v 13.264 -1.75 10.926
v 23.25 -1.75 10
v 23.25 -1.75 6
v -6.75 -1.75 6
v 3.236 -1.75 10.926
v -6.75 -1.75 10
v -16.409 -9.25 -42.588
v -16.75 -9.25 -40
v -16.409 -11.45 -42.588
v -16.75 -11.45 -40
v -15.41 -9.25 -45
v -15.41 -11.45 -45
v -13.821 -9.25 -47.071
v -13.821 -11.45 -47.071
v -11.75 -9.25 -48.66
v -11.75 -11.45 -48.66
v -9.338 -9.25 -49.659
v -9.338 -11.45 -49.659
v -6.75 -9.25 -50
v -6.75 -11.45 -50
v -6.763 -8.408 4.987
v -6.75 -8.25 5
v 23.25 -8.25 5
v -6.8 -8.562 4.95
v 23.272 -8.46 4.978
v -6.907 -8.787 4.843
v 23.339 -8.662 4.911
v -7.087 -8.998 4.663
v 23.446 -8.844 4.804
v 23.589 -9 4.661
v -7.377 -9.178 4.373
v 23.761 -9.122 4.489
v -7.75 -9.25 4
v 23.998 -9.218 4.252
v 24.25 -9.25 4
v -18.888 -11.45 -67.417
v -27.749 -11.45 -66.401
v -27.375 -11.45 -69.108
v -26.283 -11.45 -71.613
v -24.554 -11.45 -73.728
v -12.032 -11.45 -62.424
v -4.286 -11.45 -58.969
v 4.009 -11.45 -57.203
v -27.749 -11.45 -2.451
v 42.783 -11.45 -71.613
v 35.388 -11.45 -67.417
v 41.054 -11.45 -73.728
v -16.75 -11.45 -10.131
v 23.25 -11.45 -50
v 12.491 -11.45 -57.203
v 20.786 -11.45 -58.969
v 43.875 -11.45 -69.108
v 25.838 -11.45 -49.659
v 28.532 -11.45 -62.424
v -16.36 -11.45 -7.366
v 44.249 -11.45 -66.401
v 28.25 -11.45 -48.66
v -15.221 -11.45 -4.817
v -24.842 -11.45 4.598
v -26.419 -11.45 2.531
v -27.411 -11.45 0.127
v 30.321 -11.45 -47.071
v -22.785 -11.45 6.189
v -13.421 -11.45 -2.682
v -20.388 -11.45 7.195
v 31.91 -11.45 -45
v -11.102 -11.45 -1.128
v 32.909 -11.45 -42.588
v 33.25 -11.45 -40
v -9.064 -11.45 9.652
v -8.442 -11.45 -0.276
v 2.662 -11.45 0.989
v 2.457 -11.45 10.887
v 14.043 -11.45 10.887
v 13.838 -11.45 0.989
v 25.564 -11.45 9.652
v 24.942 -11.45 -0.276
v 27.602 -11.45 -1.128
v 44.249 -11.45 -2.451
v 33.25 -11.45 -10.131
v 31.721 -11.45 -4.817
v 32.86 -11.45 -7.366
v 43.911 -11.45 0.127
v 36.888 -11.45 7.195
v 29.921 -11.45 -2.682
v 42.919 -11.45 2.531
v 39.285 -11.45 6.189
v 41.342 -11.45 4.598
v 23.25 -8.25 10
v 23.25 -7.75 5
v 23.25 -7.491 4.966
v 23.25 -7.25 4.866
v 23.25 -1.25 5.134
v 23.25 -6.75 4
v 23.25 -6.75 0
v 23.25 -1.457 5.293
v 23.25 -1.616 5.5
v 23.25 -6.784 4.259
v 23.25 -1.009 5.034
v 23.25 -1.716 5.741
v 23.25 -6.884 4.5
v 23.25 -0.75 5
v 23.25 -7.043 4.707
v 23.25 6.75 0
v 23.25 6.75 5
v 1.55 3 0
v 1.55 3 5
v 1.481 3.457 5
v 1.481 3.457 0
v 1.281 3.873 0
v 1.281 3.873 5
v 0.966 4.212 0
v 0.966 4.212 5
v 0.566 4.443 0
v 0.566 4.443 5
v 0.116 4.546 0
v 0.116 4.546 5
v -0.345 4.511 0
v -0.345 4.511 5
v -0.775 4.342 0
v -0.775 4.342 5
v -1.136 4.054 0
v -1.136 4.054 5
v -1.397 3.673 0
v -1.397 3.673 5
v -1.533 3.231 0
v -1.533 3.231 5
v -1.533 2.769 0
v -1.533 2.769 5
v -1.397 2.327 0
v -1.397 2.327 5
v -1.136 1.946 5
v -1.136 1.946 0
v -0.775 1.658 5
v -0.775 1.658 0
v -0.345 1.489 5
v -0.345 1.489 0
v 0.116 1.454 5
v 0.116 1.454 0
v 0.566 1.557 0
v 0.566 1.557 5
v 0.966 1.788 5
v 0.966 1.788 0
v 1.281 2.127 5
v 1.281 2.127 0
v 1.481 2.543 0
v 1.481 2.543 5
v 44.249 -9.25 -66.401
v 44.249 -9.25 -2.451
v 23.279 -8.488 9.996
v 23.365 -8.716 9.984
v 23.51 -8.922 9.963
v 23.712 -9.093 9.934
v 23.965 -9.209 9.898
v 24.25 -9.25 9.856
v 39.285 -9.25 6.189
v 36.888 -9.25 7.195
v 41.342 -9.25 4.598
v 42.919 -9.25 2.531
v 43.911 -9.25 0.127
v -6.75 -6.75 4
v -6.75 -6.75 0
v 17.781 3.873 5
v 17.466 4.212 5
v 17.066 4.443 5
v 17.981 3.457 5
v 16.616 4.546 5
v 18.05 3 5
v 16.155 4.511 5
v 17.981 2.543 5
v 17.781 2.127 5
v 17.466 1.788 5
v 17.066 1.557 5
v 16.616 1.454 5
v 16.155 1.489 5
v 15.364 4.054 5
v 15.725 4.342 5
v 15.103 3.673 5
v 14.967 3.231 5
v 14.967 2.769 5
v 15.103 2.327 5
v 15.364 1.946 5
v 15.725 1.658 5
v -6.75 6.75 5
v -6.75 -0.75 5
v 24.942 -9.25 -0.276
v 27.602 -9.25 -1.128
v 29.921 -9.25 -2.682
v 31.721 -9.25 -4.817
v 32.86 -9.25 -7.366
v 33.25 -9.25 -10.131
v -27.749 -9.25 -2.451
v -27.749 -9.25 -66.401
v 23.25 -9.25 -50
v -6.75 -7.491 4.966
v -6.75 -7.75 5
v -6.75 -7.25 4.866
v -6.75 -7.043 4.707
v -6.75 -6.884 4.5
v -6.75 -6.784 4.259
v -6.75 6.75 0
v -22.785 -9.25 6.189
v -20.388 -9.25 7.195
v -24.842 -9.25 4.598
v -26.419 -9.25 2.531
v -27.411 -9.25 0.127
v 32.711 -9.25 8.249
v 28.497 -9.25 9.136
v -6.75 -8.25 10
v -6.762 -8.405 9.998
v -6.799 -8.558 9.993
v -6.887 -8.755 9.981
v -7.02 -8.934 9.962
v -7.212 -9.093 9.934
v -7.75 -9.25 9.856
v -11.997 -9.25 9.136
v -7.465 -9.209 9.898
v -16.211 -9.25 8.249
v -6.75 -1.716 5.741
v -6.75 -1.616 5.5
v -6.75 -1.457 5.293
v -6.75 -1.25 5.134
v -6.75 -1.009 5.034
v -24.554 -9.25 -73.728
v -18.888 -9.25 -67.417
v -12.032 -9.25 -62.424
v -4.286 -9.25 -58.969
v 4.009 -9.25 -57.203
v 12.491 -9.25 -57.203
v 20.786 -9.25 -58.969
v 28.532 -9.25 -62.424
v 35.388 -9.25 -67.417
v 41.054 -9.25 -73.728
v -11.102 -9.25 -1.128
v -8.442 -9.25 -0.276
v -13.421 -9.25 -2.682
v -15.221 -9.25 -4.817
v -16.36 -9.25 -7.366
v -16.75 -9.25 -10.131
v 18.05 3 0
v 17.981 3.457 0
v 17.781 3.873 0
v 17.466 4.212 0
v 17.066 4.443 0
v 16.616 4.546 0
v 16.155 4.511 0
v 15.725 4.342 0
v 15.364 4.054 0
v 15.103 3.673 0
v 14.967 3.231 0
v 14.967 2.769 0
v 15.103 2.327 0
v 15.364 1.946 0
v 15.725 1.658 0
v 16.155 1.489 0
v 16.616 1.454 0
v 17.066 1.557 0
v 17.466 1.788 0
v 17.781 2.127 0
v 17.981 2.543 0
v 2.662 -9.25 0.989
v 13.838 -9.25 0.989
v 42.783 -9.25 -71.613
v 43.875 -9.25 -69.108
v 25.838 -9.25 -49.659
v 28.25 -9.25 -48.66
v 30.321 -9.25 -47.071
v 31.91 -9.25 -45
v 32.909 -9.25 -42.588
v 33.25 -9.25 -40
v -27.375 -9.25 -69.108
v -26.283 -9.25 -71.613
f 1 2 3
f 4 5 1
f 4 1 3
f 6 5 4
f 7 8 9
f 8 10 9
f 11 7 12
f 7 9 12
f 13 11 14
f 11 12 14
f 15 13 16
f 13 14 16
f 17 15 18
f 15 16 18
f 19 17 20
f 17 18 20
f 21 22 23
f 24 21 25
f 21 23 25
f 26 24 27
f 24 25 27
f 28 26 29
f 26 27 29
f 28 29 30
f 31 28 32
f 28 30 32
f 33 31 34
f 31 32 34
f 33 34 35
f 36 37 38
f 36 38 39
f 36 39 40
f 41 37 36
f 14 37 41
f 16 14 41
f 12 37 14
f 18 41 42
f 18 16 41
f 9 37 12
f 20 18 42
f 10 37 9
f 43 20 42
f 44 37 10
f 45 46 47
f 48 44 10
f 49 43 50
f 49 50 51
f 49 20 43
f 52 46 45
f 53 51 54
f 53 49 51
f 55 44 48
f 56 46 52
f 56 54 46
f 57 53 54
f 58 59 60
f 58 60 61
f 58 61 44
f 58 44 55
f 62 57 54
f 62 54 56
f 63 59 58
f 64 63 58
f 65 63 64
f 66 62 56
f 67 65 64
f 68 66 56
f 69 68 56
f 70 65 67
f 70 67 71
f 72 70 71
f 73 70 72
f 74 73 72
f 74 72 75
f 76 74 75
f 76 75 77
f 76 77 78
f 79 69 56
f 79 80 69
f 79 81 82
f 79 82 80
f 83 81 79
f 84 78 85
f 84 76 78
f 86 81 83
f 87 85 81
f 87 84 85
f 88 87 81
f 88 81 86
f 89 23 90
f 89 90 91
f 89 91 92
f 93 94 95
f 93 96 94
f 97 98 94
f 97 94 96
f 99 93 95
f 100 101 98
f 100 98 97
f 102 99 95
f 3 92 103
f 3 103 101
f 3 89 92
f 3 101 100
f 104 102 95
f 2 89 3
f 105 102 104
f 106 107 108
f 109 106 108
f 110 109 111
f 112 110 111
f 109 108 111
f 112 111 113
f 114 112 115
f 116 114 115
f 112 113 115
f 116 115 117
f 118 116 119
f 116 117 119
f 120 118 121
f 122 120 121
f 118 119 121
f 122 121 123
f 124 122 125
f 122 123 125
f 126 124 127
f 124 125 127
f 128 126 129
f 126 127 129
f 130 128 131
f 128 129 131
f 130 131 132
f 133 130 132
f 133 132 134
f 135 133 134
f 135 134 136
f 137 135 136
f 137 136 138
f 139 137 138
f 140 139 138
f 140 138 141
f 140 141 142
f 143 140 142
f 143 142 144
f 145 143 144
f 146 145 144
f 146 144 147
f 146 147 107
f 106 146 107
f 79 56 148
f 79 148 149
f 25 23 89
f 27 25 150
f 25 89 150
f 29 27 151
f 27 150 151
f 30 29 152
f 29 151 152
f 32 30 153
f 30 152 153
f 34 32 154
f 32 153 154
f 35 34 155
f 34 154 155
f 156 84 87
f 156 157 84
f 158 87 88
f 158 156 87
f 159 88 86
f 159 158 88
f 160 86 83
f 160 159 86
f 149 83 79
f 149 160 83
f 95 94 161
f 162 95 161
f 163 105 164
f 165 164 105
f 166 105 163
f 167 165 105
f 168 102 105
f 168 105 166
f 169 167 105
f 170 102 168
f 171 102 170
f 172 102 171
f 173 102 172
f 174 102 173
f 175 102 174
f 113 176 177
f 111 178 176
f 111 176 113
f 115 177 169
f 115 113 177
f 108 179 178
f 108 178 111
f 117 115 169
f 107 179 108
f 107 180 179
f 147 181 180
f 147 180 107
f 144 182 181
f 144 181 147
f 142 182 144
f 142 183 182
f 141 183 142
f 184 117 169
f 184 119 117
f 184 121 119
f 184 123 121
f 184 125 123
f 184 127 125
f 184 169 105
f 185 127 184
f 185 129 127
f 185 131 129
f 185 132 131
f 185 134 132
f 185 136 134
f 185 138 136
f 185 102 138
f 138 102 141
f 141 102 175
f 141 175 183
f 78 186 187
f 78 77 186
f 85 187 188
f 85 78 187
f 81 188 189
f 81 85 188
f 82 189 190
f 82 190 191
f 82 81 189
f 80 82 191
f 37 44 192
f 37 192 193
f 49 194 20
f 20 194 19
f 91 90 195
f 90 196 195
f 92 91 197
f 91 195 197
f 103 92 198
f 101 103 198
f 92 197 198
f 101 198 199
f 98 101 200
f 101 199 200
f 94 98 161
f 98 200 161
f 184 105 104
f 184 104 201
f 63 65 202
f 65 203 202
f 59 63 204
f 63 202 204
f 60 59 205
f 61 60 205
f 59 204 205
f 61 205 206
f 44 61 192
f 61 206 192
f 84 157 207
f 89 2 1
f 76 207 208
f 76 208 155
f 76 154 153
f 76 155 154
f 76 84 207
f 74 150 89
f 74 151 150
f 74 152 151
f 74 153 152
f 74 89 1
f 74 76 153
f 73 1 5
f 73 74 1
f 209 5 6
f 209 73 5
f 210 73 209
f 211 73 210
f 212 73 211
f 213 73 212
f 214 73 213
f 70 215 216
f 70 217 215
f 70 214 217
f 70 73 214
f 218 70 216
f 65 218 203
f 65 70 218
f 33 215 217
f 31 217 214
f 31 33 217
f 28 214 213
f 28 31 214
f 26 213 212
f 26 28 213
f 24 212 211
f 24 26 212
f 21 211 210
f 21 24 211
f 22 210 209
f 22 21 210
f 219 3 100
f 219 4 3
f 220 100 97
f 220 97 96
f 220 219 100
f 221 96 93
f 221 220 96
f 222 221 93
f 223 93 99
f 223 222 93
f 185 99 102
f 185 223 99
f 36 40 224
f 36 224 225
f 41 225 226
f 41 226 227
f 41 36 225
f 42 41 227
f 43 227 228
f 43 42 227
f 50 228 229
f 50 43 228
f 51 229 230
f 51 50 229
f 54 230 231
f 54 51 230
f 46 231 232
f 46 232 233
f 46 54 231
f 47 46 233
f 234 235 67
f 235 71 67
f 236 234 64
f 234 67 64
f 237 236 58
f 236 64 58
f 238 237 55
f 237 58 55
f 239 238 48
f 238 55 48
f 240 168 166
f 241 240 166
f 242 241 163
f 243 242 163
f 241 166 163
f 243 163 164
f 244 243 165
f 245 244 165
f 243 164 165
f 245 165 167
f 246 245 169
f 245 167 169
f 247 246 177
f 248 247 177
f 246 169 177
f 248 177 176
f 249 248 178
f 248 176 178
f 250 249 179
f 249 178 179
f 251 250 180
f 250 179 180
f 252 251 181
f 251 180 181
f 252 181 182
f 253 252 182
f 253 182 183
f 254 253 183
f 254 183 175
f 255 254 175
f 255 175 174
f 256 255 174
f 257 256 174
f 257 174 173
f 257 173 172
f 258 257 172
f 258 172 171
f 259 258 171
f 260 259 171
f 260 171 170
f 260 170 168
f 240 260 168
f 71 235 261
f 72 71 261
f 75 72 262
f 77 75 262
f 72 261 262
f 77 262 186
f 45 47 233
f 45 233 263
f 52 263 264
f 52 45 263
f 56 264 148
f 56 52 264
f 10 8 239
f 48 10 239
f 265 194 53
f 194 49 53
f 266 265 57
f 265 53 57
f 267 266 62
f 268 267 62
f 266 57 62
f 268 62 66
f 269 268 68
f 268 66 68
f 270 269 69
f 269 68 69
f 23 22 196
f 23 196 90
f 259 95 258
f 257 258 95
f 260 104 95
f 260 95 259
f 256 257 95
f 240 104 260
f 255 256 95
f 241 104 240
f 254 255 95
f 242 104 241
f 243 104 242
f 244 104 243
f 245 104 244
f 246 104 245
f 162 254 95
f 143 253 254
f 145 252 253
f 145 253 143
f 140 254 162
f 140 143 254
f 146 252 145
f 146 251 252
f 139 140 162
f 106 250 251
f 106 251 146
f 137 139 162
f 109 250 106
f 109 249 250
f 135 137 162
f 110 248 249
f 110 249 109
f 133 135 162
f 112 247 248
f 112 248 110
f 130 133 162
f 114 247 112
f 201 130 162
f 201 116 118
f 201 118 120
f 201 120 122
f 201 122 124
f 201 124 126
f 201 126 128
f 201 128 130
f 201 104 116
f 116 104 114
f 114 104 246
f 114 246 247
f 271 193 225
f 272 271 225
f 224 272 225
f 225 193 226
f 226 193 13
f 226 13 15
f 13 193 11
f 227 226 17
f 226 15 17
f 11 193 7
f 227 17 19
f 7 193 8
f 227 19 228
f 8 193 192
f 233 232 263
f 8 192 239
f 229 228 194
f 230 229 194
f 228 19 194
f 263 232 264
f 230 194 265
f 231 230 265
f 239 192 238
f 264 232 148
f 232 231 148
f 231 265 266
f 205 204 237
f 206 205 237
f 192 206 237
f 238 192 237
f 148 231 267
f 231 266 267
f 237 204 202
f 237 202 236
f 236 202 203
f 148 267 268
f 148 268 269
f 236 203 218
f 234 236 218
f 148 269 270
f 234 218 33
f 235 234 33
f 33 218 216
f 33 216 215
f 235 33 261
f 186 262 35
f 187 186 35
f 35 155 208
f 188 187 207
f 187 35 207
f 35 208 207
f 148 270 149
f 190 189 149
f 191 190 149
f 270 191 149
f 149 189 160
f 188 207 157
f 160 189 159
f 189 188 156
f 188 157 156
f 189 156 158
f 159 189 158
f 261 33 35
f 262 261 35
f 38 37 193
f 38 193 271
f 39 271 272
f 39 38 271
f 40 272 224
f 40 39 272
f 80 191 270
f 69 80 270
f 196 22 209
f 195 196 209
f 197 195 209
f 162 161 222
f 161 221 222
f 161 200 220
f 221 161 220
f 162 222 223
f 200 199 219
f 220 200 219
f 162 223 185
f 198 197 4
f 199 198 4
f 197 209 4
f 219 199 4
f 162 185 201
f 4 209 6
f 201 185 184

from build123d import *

# Parameters (mm, degrees)
EXTRUDE_1_DEPTH             = 2.2000000000000006
EXTRUDE_2_DEPTH             = 16.000000000000004
SKETCH_3_W                  = 30
SKETCH_3_H                  = 13.500000000000002
EXTRUDE_3_DEPTH             = 5
CUT_EXTRUDE_START           = -8.5
CUT_EXTRUDE_1_DEPTH         = 8.5
CUT_EXTRUDE_2_DEPTH         = 88.46305189948819
HOLE_WIZARD_3_1_3_1_1_D     = 3.1
HOLE_WIZARD_3_1_3_1_1_DEPTH = 11.041658668
FILLET_1_R                  = 1
FILLET_2_R                  = 10


with BuildPart() as part:
    # 草图1 → 凸台-拉伸1 (new body)
    with BuildSketch(Plane.XZ.offset(11.45)):
        with BuildLine():
            Line((-27.748687791341045, 4.896974351176933), (-27.748687791341048, -66.4009079535447))
            ThreePointArc((-27.748687791341048, -66.4009079535447), (-26.915275099995267, -70.3976162382234), (-24.55395236877715, -73.7281430412905))
            ThreePointArc((-24.55395236877715, -73.7281430412905), (8.250000000000021, -56.98000000000004), (41.0539523687772, -73.7281430412905))
            ThreePointArc((41.0539523687772, -73.7281430412905), (43.41527509999529, -70.3976162382234), (44.24868779134105, -66.4009079535447))
            Line((44.24868779134105, -66.4009079535447), (44.24868779134099, 4.896974351176947))
            ThreePointArc((44.24868779134099, 4.896974351176947), (8.249999999999982, 11.041658667751605), (-27.748687791341045, 4.896974351176933))
        make_face()
    extrude(amount=-EXTRUDE_1_DEPTH)

    # 草图2 → 凸台-拉伸2 (add)
    with BuildSketch(Plane(origin=(0, -9.25, 0), x_dir=(-1, 0, 0), z_dir=(0, 1, 0))):
        with BuildLine():
            Line((6.75, 5), (-23.25, 5))
            Line((-23.25, 5), (-23.25, 9.99999999999994))
            ThreePointArc((-23.25, 9.99999999999994), (-8.249999999999993, 11.041658667751605), (6.749999999999999, 9.99999999999994))
            Line((6.749999999999999, 9.99999999999994), (6.75, 5))
        make_face()
    extrude(amount=EXTRUDE_2_DEPTH)

    # 草图3 → 凸台-拉伸3 (add)
    with BuildSketch(Plane(origin=(0, 0, 5), x_dir=(-1, 0, 0), z_dir=(0, 0, -1))):
        with Locations((-8.25, 0)):
            Rectangle(SKETCH_3_W, SKETCH_3_H)
    extrude(amount=EXTRUDE_3_DEPTH)

    # 草图4 → 切除-拉伸1 (cut)
    with BuildSketch(Plane(origin=(0, 6.750000000000004, 0), x_dir=(-1, 0, 0), z_dir=(0, 1, 0)).offset(CUT_EXTRUDE_START)):
        with BuildLine():
            Line((-23.25, 9.99999999999994), (-23.25, 5))
            Line((-23.25, 5), (6.75, 5))
            Line((6.75, 5), (6.749999999999999, 9.99999999999994))
            ThreePointArc((6.749999999999999, 9.99999999999994), (-8.249999999999993, 11.041658667751605), (-23.25, 9.99999999999994))
        make_face()
    extrude(amount=CUT_EXTRUDE_1_DEPTH, mode=Mode.SUBTRACT)

    # 草图5 → 切除-拉伸2 (cut, through all)
    with BuildSketch(Plane(origin=(0, -9.25, 0), x_dir=(-1, 0, 0), z_dir=(0, 1, 0))):
        with BuildLine():
            Line((-33.25000000000001, -2.0737612102855603), (-33.25, -50))
            Line((-33.25, -50), (16.75, -50))
            Line((16.75, -50), (16.749999999999993, -2.073761210285574))
            ThreePointArc((16.749999999999993, -2.073761210285574), (-8.249999999999995, 1.1473308976777048), (-33.25000000000001, -2.0737612102855603))
        make_face()
    extrude(amount=-CUT_EXTRUDE_2_DEPTH, mode=Mode.SUBTRACT)

    # Ø3.1 (3.1) 直径孔1
    with Locations(Plane(origin=(0, 0, 0), x_dir=(-1, 0, 0), z_dir=(0, 0, -1))):
        with Locations((-16.5, 3), (0, 3)):
            Hole(HOLE_WIZARD_3_1_3_1_1_D / 2, depth=HOLE_WIZARD_3_1_3_1_1_DEPTH)

    # 圆角1
    fillet_1_edges = [part.edges().sort_by_distance(p)[0] for p in [
        (-6.75, -9.25, 7.49999999999997),
        (23.25, -9.25, 7.49999999999997),
        (8.25, -9.25, 5),
        (8.25, -6.75, 5),
        (8.25, -1.7499999999999956, 5),
    ]]
    fillet(fillet_1_edges, radius=FILLET_1_R)

    # 圆角2
    fillet_2_edges = [part.edges().sort_by_distance(p)[0] for p in [
        (44.24868779134099, -10.35, 4.896974351176949),
        (-27.748687791341048, -10.35, 4.896974351176935),
        (33.25, -10.35, -2.0737612102855643),
        (-16.749999999999993, -10.35, -2.073761210285571),
        (-16.75, -10.35, -50),
        (33.25, -10.35, -50),
    ]]
    fillet(fillet_2_edges, radius=FILLET_2_R)


solid = part.part
